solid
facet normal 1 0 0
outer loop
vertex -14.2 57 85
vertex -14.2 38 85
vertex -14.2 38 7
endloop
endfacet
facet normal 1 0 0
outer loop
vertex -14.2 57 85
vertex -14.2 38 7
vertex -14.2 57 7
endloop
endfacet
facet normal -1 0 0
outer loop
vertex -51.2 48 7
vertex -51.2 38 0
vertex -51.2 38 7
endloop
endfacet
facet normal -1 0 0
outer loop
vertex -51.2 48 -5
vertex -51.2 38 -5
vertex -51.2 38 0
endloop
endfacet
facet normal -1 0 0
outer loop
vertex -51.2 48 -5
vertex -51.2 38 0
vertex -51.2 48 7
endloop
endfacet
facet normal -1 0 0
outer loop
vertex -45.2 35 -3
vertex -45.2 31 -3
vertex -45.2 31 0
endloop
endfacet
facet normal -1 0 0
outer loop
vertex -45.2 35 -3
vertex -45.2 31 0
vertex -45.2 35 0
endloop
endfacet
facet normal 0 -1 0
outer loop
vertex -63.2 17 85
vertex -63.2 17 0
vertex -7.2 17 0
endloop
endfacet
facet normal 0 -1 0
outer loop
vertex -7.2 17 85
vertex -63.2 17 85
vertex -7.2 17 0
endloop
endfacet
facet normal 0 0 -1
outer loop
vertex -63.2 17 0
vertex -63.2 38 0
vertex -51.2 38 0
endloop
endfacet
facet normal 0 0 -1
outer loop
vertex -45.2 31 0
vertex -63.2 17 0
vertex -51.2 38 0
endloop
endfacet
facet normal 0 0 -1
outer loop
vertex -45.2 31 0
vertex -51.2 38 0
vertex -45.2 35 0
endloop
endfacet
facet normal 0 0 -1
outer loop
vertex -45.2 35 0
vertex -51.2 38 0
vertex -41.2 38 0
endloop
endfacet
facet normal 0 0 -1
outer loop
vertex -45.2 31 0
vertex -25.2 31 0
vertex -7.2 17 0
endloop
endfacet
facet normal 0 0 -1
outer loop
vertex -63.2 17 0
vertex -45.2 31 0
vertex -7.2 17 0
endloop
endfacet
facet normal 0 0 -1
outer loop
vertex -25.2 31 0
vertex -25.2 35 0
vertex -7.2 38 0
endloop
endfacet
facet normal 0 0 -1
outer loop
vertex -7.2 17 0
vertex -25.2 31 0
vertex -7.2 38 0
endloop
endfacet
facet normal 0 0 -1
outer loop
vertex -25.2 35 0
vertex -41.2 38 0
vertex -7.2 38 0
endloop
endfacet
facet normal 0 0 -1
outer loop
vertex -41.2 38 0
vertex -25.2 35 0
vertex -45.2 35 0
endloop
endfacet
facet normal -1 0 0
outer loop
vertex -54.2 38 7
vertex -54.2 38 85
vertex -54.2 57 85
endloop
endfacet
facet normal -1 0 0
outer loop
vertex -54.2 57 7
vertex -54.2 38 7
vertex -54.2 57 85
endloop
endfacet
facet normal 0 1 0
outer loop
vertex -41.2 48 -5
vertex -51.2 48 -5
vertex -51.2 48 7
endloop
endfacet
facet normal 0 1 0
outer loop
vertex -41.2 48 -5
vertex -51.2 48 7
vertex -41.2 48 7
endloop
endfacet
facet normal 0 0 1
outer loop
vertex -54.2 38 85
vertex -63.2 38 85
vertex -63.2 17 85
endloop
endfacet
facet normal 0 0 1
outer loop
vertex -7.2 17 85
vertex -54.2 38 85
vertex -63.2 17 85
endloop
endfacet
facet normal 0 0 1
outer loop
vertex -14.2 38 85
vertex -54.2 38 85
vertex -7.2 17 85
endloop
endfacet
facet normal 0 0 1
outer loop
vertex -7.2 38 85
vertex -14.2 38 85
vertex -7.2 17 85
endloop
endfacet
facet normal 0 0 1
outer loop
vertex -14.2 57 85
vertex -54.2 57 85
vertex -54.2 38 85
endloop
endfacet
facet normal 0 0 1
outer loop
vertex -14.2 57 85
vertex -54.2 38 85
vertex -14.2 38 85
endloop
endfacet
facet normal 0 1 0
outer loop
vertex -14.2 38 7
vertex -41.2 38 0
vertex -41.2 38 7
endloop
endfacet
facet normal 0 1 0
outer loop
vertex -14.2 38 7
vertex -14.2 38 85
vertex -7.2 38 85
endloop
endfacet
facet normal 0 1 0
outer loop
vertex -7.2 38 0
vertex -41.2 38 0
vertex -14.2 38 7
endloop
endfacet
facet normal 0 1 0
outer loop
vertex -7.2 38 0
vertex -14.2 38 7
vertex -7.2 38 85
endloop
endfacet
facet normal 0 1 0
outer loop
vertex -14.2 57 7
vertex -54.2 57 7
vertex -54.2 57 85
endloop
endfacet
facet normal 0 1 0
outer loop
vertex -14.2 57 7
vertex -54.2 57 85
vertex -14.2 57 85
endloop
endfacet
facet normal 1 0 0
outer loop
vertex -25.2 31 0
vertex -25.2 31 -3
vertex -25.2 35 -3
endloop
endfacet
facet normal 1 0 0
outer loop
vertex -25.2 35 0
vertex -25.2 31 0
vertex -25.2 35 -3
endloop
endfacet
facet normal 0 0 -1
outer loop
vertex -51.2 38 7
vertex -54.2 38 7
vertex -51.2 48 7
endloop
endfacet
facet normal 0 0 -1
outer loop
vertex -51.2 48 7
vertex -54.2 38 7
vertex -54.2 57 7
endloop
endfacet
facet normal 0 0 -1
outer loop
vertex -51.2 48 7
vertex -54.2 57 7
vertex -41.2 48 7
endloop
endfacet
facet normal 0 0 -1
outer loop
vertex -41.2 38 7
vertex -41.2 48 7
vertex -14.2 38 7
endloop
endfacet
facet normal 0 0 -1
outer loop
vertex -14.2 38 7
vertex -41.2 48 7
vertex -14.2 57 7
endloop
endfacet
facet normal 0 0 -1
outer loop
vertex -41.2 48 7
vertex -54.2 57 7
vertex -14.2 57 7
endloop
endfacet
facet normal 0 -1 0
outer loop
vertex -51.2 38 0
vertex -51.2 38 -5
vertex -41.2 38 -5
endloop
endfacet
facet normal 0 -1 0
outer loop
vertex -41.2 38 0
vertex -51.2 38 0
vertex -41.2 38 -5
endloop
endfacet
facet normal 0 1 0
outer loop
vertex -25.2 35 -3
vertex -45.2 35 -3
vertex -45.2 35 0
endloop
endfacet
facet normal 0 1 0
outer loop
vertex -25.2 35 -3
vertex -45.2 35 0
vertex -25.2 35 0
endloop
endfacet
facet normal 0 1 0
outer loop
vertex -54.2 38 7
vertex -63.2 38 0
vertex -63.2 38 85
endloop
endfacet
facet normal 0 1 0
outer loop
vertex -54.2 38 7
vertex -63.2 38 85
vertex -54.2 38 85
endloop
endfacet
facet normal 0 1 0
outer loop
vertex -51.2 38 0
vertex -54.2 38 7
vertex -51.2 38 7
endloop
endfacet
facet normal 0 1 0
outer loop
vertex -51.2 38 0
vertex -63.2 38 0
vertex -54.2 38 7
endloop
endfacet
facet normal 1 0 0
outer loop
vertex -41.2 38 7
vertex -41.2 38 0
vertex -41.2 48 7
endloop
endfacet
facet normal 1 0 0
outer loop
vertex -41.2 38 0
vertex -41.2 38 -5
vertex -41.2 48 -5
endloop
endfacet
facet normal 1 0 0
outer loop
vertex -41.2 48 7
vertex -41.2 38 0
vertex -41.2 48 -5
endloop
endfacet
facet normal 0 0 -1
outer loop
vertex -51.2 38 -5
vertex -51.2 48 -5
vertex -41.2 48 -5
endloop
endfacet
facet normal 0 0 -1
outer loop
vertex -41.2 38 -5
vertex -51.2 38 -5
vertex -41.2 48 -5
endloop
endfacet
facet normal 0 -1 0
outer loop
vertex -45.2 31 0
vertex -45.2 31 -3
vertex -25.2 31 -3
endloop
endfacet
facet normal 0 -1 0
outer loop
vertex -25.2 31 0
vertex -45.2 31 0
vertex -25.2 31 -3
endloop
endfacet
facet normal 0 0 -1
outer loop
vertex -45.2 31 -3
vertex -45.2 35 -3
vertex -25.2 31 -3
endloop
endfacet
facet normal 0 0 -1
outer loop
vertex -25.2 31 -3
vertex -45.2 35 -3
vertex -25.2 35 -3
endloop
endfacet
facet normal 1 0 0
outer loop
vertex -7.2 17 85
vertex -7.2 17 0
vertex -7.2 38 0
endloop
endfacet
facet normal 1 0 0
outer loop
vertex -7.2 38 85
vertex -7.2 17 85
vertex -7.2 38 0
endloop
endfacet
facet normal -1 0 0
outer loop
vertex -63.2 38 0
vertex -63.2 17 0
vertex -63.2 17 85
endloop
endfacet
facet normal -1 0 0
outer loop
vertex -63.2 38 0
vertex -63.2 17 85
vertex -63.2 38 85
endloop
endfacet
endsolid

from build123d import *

# Parameters (mm, degrees)
BOX_W        = 56
BOX_H        = 21
BOX_DEPTH    = 85
BOX002_W     = 10
BOX002_H     = 10
BOX002_DEPTH = 12
BOX458_W     = 20
BOX458_H     = 4
BOX458_DEPTH = 3
BOX003_W     = 40
BOX003_H     = 19
BOX003_DEPTH = 78


with BuildPart() as box:
    # Box → Box (new body)
    with BuildSketch(Plane.XY):
        with Locations((28, 10.5)):
            Rectangle(BOX_W, BOX_H)
    extrude(amount=BOX_DEPTH)


with BuildPart() as box002:
    # Box002 → Box002 (new body)
    with BuildSketch(Plane(origin=(12, 21, -5), x_dir=(1, 0, 0), z_dir=(0, 0, 1))):
        with Locations((5, 5)):
            Rectangle(BOX002_W, BOX002_H)
    extrude(amount=BOX002_DEPTH)


with BuildPart() as box458:
    # Box458 → Box458 (new body)
    with BuildSketch(Plane(origin=(18, 14, -3), x_dir=(1, 0, 0), z_dir=(0, 0, 1))):
        with Locations((10, 2)):
            Rectangle(BOX458_W, BOX458_H)
    extrude(amount=BOX458_DEPTH)


with BuildPart() as fusion363:
    # Box003 → Box003 (new body)
    with BuildSketch(Plane(origin=(9, 21, 7), x_dir=(1, 0, 0), z_dir=(0, 0, 1))):
        with Locations((20, 9.5)):
            Rectangle(BOX003_W, BOX003_H)
    extrude(amount=BOX003_DEPTH)

    # Fusion363: union Box, Box002, Box458
    add(box.part)
    add(box002.part)
    add(box458.part)


with BuildPart() as fusion363_1:
    # Fusion363 placement: moved
    add(fusion363.part.moved(Location((-63.2, 17, 0))))


solid = fusion363_1.part
